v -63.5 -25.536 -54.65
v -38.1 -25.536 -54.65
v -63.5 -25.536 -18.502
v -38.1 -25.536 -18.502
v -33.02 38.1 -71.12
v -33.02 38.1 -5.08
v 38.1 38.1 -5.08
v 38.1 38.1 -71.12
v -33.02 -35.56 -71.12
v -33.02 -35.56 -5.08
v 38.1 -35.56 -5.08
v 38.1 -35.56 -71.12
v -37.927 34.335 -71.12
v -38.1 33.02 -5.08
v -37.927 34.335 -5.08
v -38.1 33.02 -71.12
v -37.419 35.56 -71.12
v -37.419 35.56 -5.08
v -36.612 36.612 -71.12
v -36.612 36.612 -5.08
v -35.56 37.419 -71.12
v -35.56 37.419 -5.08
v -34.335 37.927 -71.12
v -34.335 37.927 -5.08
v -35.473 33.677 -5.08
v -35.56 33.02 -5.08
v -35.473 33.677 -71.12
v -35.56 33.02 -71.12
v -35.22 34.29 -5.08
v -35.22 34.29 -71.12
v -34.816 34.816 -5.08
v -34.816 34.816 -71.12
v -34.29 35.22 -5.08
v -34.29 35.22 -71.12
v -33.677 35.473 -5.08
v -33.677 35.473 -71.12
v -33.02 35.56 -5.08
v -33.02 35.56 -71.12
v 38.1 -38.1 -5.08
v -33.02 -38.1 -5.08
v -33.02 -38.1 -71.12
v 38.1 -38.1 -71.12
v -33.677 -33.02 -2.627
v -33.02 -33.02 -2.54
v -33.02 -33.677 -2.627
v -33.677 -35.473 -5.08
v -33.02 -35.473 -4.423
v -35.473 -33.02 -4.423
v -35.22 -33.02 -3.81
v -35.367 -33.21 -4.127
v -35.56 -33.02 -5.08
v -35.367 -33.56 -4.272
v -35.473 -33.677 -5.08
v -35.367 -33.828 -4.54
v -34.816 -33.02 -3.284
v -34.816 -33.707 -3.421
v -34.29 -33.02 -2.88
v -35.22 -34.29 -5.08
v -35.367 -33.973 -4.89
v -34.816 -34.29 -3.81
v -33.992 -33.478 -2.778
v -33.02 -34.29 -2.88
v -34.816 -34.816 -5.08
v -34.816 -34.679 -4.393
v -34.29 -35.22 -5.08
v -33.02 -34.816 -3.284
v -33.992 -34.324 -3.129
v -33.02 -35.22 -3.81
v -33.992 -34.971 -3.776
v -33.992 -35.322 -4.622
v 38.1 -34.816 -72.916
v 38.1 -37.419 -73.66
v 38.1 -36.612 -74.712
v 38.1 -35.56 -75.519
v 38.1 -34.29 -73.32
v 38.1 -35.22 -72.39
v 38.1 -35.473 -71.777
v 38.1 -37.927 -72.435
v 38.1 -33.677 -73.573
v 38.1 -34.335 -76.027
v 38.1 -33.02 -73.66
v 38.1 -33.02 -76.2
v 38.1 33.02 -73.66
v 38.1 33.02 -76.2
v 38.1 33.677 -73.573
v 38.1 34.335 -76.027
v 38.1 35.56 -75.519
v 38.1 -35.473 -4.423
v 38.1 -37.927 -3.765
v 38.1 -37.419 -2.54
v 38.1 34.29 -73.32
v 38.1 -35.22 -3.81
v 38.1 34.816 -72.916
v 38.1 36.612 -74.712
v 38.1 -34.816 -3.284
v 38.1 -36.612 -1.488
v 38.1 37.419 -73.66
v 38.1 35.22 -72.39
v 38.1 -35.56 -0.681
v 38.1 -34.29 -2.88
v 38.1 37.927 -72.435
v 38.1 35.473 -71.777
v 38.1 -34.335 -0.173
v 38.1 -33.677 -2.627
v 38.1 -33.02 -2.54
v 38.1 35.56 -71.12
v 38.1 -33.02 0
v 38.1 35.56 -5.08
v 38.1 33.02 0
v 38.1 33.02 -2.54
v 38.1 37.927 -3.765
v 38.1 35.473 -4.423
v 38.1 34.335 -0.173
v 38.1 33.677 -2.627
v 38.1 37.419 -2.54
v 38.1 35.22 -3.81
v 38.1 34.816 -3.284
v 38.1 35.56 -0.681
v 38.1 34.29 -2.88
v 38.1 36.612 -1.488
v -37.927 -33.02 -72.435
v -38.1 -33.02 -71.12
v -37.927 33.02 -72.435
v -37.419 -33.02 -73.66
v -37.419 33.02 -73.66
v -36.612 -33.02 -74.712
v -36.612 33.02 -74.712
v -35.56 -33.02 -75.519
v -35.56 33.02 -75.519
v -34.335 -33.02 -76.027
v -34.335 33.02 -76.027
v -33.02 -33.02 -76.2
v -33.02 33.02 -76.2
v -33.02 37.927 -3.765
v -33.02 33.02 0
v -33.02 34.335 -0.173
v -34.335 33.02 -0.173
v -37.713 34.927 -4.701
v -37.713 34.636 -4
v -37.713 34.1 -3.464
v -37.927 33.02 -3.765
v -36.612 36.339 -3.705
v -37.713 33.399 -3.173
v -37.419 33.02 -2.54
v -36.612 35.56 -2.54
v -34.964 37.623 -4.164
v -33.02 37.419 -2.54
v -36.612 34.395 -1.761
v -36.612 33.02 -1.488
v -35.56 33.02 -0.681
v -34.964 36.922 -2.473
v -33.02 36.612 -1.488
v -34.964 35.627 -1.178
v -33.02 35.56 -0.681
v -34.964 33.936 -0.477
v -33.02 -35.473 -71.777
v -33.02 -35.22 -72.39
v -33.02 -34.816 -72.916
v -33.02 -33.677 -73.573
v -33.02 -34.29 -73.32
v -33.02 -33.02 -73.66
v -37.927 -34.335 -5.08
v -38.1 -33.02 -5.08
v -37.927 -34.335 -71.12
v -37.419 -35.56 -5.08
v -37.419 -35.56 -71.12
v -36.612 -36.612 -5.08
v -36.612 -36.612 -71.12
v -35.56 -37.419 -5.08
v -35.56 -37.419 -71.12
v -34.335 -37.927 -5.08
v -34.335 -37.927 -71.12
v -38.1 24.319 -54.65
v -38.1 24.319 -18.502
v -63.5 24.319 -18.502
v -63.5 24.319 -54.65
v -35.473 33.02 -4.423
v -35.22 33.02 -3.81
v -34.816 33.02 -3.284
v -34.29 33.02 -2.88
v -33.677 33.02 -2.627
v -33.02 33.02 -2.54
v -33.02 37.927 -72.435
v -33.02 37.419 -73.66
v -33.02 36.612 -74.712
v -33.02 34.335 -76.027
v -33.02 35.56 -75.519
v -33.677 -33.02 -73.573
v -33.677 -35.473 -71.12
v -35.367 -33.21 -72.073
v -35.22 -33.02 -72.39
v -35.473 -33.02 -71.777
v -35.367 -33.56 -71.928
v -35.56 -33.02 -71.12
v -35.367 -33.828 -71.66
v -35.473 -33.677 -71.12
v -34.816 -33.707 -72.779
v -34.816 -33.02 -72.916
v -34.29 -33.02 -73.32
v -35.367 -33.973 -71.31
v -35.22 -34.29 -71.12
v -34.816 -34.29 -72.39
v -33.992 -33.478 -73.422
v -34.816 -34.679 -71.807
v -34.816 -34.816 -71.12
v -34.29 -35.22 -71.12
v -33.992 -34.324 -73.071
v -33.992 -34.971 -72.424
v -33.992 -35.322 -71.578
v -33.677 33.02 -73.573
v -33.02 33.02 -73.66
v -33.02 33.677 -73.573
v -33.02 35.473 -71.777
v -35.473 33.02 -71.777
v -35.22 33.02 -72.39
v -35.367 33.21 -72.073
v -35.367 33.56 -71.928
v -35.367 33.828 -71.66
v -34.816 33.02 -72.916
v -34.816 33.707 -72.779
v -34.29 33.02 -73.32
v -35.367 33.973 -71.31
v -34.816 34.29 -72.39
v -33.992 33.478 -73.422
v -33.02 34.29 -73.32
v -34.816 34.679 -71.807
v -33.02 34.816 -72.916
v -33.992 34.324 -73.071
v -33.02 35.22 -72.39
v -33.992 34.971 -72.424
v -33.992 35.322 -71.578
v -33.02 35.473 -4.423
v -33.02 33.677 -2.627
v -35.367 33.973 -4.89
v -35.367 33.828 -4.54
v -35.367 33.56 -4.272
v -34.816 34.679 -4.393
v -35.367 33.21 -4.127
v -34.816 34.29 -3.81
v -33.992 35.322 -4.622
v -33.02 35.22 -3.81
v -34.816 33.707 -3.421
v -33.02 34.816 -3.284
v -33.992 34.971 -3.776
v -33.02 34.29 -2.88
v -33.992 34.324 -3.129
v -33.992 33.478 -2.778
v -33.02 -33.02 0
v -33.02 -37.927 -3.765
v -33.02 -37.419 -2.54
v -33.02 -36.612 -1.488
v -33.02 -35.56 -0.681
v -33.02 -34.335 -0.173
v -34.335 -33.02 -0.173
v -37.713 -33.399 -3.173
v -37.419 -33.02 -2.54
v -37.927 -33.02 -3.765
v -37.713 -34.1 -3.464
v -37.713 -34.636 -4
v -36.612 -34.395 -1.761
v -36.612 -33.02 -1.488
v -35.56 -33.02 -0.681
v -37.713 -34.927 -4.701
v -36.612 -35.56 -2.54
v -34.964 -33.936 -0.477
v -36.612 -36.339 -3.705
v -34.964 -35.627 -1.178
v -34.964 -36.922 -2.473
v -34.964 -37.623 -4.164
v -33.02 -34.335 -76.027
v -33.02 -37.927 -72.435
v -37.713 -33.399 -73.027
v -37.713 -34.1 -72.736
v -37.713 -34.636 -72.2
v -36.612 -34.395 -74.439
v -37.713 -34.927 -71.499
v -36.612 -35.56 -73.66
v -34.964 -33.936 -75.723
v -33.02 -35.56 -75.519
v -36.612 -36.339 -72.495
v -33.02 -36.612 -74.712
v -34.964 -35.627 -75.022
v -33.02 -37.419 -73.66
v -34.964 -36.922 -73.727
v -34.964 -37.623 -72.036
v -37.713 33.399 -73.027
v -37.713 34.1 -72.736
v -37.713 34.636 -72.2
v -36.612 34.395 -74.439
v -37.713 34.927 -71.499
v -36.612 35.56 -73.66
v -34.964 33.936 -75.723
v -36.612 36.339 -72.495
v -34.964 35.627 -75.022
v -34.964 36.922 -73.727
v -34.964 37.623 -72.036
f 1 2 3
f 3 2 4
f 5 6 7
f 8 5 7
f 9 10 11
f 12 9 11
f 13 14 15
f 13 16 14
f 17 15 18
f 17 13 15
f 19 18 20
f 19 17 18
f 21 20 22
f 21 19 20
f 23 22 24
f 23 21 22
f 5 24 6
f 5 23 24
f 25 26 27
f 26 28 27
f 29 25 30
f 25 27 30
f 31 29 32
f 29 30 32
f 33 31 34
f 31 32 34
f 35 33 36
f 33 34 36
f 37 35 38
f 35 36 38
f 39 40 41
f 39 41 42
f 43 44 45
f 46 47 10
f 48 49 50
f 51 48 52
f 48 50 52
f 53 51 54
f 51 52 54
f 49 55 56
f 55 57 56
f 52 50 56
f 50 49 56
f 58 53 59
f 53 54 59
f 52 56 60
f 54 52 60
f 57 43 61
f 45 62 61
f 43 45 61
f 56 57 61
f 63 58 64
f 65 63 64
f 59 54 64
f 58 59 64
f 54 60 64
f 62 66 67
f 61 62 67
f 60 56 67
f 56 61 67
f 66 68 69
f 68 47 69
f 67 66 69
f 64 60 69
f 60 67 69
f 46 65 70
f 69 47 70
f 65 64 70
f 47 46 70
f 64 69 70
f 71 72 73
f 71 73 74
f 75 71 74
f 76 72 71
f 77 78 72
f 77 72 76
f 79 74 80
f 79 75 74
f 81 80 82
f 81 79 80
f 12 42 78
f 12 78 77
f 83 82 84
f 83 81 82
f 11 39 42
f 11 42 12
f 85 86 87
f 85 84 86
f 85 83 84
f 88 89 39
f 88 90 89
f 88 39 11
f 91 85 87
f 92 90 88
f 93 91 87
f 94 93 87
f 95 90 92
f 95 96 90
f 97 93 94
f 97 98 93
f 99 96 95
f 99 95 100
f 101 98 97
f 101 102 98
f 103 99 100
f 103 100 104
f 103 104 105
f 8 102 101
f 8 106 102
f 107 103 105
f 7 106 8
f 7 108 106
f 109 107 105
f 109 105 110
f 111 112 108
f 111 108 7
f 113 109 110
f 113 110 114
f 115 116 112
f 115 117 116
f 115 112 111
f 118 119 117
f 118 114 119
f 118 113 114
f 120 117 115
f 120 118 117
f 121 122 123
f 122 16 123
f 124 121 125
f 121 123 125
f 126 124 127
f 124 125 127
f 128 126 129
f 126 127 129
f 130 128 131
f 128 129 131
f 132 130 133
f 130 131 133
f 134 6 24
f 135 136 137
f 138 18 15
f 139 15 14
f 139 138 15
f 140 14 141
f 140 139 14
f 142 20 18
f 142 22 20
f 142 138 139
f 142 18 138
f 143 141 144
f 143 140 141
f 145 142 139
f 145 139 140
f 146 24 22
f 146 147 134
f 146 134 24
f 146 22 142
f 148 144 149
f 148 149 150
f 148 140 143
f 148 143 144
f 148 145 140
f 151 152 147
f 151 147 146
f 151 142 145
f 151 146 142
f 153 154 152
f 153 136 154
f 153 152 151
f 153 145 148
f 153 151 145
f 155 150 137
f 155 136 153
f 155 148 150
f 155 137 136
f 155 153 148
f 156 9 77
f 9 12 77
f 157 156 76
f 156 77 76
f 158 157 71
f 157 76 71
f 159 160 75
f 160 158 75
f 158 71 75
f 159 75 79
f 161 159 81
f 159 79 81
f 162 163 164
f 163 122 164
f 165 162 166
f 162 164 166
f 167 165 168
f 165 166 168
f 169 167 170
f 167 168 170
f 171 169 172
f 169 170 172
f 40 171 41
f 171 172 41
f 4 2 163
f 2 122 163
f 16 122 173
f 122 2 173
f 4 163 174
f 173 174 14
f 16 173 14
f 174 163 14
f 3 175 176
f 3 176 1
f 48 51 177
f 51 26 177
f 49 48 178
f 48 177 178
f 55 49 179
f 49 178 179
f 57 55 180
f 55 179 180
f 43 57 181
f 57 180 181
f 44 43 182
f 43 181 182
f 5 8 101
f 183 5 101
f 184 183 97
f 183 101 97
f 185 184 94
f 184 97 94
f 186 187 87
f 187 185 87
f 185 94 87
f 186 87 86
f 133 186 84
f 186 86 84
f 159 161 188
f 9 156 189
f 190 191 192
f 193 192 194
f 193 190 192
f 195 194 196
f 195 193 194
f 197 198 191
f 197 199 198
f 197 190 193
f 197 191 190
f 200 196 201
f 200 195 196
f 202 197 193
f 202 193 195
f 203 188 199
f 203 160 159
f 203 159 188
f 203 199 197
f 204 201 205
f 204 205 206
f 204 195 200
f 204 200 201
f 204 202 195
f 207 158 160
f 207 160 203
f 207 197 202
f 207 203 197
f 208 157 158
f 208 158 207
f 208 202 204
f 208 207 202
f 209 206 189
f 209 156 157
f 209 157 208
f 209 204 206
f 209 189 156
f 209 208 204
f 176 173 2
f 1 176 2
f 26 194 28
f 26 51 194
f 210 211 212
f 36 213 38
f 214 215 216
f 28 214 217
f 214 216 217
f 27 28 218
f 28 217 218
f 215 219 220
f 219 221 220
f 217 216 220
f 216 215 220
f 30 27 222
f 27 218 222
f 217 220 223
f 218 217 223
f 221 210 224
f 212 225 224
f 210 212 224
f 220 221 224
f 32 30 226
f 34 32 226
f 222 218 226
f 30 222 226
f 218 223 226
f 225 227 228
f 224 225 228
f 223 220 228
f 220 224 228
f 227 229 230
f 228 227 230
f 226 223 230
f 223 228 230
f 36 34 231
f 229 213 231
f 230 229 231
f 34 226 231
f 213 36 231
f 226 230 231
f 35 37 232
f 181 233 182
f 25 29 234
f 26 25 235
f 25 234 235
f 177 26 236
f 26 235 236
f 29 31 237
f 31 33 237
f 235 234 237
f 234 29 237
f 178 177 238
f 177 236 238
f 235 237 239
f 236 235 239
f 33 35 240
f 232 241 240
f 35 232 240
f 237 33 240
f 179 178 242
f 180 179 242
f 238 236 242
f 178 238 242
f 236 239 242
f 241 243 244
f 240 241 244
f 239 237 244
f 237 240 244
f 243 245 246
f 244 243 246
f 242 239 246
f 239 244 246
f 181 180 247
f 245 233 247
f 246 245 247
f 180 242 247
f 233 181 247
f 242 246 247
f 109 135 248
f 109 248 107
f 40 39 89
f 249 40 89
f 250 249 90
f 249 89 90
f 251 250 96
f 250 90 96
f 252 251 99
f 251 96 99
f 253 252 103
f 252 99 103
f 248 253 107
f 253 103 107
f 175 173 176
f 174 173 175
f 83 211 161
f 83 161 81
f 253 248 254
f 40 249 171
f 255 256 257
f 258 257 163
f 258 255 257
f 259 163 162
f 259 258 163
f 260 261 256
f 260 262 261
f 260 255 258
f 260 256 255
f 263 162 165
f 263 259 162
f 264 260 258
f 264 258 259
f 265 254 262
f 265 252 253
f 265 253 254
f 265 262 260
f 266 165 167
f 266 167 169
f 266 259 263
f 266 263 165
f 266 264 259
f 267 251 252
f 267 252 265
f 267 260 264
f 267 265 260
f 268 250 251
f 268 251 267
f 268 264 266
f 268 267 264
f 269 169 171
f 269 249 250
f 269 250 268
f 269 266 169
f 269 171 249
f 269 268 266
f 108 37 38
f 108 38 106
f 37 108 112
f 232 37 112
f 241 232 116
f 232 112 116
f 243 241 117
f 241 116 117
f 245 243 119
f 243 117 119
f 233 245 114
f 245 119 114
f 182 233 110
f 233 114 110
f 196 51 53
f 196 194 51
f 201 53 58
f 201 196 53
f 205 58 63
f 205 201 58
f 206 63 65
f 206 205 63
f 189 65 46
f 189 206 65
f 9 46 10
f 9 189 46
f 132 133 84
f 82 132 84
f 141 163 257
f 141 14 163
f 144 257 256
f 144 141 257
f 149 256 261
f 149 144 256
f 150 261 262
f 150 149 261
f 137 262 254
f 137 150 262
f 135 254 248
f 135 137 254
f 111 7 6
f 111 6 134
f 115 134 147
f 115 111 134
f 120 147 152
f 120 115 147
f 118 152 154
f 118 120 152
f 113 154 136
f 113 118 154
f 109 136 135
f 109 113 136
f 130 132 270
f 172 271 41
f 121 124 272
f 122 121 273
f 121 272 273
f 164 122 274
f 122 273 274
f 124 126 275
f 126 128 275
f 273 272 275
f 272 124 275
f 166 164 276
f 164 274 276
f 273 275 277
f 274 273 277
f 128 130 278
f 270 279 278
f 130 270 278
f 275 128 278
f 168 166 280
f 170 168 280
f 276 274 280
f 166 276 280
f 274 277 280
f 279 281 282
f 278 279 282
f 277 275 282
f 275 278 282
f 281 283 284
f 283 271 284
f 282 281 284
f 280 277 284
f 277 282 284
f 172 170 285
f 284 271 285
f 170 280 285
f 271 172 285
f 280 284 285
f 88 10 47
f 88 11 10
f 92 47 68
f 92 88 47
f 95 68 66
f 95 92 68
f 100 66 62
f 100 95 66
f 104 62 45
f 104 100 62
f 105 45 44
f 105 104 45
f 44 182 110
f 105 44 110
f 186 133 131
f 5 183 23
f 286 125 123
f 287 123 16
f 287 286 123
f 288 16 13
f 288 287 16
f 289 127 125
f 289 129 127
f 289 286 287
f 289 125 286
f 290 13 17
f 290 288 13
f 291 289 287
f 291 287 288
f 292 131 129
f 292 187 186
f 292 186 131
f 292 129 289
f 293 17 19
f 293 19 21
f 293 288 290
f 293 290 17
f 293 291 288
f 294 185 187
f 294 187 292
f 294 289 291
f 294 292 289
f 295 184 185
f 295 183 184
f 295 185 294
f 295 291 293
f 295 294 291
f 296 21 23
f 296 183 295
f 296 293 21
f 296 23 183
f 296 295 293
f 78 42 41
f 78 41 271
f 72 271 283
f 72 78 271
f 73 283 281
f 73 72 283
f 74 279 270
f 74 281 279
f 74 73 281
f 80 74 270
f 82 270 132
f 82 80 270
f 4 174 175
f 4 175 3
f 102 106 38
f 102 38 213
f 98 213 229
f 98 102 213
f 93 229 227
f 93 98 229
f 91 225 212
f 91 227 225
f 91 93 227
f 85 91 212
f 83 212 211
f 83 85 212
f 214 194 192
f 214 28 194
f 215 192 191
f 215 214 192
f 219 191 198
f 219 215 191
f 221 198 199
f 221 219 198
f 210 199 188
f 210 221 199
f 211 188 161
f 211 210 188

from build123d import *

# Parameters (mm, degrees)
F0_W     = 76.2
F0_H     = 76.2
F1_DEPTH = 76.2
F2_R     = 5.08
F3_T     = -2.54
F4_W     = 49.854696
F4_H     = 36.147542
F5_DEPTH = 25.4


with BuildPart() as f1:
    # F0 (on Top) → F1 (new body)
    with BuildSketch(Plane.XY):
        Rectangle(F0_W, F0_H)
    extrude(amount=-F1_DEPTH)

    # F2
    f2_edges = [f1.edges().sort_by_distance(p)[0] for p in [
        (0, -38.1, 0),
        (0, 38.1, 0),
        (0, -38.1, -76.2),
        (0, 38.1, -76.2),
        (-38.1, 0, -76.2),
        (-38.1, 38.1, -38.1),
        (-38.1, 0, 0),
        (-38.1, -38.1, -38.1),
    ]]
    fillet(f2_edges, radius=F2_R)

    # F3
    f3_openings = [f1.faces().sort_by_distance(p)[0] for p in [
        (38.1, 0, -38.1),
    ]]
    offset(amount=F3_T, openings=f3_openings)

    # F4 (on face) → F5 (join)
    with BuildSketch(Plane(origin=(-38.1, 0, 0), x_dir=(0, -1, 0), z_dir=(-1, 0, 0))):
        with Locations((0.608757, -36.575835)):
            Rectangle(F4_W, F4_H)
    extrude(amount=F5_DEPTH)


solid = f1.part
